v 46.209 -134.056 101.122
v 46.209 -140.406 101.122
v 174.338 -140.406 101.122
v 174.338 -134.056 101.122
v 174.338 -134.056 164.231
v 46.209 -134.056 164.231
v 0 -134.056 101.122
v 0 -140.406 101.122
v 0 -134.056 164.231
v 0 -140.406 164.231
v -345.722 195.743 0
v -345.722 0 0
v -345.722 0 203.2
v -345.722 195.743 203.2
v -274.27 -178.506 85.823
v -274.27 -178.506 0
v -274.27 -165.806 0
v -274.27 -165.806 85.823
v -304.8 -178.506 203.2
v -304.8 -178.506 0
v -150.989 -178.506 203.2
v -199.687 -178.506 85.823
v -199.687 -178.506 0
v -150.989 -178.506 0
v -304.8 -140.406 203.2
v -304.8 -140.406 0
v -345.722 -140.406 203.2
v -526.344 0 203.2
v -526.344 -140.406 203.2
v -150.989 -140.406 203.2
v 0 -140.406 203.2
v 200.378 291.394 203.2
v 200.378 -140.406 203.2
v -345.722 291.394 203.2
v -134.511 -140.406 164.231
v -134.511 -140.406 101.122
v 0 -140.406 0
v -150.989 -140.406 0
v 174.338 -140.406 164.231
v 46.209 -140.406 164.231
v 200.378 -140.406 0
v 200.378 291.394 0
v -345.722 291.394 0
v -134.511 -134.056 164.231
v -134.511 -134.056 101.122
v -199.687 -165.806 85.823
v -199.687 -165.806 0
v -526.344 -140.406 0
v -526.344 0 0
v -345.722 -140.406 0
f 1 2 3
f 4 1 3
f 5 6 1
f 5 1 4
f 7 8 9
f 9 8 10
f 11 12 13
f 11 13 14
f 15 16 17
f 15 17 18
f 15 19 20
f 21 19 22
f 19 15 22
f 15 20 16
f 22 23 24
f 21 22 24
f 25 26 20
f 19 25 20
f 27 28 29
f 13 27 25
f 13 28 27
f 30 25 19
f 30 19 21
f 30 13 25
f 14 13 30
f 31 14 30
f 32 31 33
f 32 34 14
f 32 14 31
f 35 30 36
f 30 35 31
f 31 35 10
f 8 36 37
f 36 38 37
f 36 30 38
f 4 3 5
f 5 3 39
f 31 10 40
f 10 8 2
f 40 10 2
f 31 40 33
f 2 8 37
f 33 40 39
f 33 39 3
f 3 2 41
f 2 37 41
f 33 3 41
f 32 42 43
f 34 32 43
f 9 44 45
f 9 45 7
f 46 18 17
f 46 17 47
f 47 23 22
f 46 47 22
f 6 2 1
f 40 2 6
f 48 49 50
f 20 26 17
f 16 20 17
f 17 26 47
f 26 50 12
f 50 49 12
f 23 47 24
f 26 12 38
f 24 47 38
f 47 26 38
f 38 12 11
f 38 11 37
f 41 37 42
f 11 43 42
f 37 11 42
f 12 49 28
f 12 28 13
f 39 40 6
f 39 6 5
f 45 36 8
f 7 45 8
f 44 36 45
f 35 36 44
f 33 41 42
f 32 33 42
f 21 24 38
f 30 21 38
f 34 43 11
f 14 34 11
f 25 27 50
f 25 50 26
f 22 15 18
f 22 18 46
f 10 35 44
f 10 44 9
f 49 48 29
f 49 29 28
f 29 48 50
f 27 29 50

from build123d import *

# Parameters (mm, degrees)
F0_W     = 180.622216
F0_H     = 140.405509
F0_W_2   = 194.250329
F0_H_2   = 195.742518
F0_W_3   = 200.377738
F0_H_3   = 113.020826
F1_DEPTH = 203.2
F2_W     = 74.582949
F2_H     = 85.822828
F3_DEPTH = 12.7
F4_W     = 134.511486
F4_H     = 63.10866
F5_DEPTH = 6.35
F6_W     = 128.129702
F6_H     = 63.10866
F7_DEPTH = 6.35


with BuildPart() as f1:
    # F0 (on Top) → F1 (new body)
    with BuildSketch(Plane.XY):
        with Locations((-436.033275, -70.202754)):
            Rectangle(F0_W, F0_H)
        Polygon((-151.471838, 0), (-345.722167, 0), (-345.722167, -140.405509), (-304.799954, -140.405509), (-304.799954, -178.505509), (-150.988865, -178.505509), (-150.988865, -140.405509), (0, -140.405509), (0, 0), (200.377738, 0), (200.377738, 178.373605), (0, 178.373605), (0, 291.394431), (-345.722167, 291.394431), (-345.722167, 195.742518), (-151.471838, 195.742518), align=None)
        with Locations((-248.597002, 97.871259)):
            Rectangle(F0_W_2, F0_H_2)
        with Locations((100.188869, 234.884018)):
            Rectangle(F0_W_3, F0_H_3)
        with Locations((100.188869, -70.202754)):
            Rectangle(F0_W_3, F0_H)
    extrude(amount=F1_DEPTH)

    # F2 (on face) → F3 (cut)
    with BuildSketch(Plane.XZ.offset(178.505509)):
        with Locations((-236.978226, 42.911414)):
            Rectangle(F2_W, F2_H)
    extrude(amount=-F3_DEPTH, mode=Mode.SUBTRACT)

    # F4 (on face) → F5 (cut)
    with BuildSketch(Plane.XZ.offset(140.405509)):
        with Locations((-67.255743, 132.67624)):
            Rectangle(F4_W, F4_H)
    extrude(amount=-F5_DEPTH, mode=Mode.SUBTRACT)

    # F6 (on face) → F7 (cut)
    with BuildSketch(Plane.XZ.offset(140.405509)):
        with Locations((110.273594, 132.67624)):
            Rectangle(F6_W, F6_H)
    extrude(amount=-F7_DEPTH, mode=Mode.SUBTRACT)


solid = f1.part
